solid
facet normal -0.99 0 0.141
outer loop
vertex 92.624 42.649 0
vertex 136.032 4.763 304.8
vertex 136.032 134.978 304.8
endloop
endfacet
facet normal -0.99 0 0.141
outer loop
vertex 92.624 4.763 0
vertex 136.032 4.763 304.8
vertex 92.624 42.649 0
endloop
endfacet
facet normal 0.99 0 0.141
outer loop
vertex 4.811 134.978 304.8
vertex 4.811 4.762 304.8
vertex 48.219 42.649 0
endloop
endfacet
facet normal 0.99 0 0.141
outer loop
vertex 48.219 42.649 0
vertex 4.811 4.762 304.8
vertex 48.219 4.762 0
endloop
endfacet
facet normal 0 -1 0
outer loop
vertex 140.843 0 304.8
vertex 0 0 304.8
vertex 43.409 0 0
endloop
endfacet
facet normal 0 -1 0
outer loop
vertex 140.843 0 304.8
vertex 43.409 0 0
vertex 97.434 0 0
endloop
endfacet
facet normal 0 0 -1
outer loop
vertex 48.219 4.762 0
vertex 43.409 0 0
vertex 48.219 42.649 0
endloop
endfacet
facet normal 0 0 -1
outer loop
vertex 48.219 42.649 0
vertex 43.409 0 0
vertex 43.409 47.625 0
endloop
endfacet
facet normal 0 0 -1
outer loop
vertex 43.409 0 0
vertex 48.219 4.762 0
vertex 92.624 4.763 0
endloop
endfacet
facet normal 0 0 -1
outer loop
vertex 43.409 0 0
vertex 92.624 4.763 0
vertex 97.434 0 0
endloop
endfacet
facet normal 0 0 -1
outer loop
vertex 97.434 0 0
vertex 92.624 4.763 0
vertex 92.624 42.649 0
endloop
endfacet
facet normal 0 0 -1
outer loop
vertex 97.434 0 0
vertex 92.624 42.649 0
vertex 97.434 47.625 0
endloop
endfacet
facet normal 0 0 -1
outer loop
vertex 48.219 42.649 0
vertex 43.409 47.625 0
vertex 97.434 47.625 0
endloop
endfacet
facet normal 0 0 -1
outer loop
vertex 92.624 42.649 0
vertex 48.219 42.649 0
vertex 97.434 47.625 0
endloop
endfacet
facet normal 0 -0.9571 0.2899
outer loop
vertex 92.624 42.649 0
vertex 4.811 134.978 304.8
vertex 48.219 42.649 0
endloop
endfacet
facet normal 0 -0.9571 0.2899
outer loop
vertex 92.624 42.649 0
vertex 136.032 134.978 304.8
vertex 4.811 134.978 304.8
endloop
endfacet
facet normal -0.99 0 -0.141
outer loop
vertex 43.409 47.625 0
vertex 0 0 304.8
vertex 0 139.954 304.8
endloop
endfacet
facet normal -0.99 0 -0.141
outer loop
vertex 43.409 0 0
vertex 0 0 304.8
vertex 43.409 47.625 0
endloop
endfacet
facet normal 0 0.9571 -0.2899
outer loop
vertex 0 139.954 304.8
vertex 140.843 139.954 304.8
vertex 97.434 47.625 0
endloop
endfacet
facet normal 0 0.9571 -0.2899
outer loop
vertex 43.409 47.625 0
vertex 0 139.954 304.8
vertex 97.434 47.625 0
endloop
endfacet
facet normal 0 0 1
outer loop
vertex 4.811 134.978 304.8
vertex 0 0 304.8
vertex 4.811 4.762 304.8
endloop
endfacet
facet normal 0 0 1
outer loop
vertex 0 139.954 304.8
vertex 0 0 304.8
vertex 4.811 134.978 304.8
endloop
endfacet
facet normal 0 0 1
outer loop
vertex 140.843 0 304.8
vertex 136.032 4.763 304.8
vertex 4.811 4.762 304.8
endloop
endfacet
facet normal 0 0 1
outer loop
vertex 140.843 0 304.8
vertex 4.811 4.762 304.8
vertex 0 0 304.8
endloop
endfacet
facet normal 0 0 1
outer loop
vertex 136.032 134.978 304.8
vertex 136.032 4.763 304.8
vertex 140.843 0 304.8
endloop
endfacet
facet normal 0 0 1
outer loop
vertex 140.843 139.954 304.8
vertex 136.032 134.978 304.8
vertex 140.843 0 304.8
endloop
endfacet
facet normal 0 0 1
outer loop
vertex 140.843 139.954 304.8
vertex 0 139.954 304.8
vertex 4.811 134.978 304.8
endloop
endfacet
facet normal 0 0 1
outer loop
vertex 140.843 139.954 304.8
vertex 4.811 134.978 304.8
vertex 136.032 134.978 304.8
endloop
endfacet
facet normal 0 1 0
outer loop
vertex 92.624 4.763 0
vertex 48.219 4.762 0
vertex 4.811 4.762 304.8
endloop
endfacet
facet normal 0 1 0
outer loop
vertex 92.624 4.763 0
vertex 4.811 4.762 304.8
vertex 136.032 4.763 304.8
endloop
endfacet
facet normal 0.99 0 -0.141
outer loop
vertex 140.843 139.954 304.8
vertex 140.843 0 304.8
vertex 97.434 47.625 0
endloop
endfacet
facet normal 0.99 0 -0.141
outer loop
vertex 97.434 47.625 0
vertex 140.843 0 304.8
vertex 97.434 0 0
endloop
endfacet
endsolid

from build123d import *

# Parameters (mm, degrees)
SKETCH1_W           = 140.843
SKETCH1_H           = 139.954
BOSS_EXTRUDE1_DEPTH = 304.8
CUT_EXTRUDE1_DEPTH  = 364.767663166
CUT_EXTRUDE2_DEPTH  = 364.767663166
SHELL1_T            = -4.7625


with BuildPart() as part:
    # Sketch1 → Boss-Extrude1 (new body)
    with BuildSketch(Plane.XY):
        with Locations((70.4215, 69.977)):
            Rectangle(SKETCH1_W, SKETCH1_H)
    extrude(amount=BOSS_EXTRUDE1_DEPTH)

    # Sketch2 → Cut-Extrude1 (cut, through all)
    with BuildSketch(Plane(origin=(140.843, 0, 0), x_dir=(0, 0, -1), z_dir=(1, 0, 0))):
        Polygon((-304.8, 139.954), (0, 47.625), (0, 139.954), align=None)
    extrude(amount=-CUT_EXTRUDE1_DEPTH, mode=Mode.SUBTRACT)

    # Sketch3 → Cut-Extrude2 (cut, through all)
    with BuildSketch(Plane.XZ):
        Polygon((140.843, 304.8), (97.4344, 0), (140.843, 0), align=None)
        Polygon((0, 304.8), (43.4086, 0), (0, 0), align=None)
    extrude(amount=-CUT_EXTRUDE2_DEPTH, mode=Mode.SUBTRACT)

    # Shell1
    shell1_openings = [part.faces().sort_by_distance(p)[0] for p in [
        (70.4215, 69.977, 304.8),
        (70.4215, 23.8125, 0),
    ]]
    offset(amount=SHELL1_T, openings=shell1_openings, kind=Kind.INTERSECTION)


solid = part.part
